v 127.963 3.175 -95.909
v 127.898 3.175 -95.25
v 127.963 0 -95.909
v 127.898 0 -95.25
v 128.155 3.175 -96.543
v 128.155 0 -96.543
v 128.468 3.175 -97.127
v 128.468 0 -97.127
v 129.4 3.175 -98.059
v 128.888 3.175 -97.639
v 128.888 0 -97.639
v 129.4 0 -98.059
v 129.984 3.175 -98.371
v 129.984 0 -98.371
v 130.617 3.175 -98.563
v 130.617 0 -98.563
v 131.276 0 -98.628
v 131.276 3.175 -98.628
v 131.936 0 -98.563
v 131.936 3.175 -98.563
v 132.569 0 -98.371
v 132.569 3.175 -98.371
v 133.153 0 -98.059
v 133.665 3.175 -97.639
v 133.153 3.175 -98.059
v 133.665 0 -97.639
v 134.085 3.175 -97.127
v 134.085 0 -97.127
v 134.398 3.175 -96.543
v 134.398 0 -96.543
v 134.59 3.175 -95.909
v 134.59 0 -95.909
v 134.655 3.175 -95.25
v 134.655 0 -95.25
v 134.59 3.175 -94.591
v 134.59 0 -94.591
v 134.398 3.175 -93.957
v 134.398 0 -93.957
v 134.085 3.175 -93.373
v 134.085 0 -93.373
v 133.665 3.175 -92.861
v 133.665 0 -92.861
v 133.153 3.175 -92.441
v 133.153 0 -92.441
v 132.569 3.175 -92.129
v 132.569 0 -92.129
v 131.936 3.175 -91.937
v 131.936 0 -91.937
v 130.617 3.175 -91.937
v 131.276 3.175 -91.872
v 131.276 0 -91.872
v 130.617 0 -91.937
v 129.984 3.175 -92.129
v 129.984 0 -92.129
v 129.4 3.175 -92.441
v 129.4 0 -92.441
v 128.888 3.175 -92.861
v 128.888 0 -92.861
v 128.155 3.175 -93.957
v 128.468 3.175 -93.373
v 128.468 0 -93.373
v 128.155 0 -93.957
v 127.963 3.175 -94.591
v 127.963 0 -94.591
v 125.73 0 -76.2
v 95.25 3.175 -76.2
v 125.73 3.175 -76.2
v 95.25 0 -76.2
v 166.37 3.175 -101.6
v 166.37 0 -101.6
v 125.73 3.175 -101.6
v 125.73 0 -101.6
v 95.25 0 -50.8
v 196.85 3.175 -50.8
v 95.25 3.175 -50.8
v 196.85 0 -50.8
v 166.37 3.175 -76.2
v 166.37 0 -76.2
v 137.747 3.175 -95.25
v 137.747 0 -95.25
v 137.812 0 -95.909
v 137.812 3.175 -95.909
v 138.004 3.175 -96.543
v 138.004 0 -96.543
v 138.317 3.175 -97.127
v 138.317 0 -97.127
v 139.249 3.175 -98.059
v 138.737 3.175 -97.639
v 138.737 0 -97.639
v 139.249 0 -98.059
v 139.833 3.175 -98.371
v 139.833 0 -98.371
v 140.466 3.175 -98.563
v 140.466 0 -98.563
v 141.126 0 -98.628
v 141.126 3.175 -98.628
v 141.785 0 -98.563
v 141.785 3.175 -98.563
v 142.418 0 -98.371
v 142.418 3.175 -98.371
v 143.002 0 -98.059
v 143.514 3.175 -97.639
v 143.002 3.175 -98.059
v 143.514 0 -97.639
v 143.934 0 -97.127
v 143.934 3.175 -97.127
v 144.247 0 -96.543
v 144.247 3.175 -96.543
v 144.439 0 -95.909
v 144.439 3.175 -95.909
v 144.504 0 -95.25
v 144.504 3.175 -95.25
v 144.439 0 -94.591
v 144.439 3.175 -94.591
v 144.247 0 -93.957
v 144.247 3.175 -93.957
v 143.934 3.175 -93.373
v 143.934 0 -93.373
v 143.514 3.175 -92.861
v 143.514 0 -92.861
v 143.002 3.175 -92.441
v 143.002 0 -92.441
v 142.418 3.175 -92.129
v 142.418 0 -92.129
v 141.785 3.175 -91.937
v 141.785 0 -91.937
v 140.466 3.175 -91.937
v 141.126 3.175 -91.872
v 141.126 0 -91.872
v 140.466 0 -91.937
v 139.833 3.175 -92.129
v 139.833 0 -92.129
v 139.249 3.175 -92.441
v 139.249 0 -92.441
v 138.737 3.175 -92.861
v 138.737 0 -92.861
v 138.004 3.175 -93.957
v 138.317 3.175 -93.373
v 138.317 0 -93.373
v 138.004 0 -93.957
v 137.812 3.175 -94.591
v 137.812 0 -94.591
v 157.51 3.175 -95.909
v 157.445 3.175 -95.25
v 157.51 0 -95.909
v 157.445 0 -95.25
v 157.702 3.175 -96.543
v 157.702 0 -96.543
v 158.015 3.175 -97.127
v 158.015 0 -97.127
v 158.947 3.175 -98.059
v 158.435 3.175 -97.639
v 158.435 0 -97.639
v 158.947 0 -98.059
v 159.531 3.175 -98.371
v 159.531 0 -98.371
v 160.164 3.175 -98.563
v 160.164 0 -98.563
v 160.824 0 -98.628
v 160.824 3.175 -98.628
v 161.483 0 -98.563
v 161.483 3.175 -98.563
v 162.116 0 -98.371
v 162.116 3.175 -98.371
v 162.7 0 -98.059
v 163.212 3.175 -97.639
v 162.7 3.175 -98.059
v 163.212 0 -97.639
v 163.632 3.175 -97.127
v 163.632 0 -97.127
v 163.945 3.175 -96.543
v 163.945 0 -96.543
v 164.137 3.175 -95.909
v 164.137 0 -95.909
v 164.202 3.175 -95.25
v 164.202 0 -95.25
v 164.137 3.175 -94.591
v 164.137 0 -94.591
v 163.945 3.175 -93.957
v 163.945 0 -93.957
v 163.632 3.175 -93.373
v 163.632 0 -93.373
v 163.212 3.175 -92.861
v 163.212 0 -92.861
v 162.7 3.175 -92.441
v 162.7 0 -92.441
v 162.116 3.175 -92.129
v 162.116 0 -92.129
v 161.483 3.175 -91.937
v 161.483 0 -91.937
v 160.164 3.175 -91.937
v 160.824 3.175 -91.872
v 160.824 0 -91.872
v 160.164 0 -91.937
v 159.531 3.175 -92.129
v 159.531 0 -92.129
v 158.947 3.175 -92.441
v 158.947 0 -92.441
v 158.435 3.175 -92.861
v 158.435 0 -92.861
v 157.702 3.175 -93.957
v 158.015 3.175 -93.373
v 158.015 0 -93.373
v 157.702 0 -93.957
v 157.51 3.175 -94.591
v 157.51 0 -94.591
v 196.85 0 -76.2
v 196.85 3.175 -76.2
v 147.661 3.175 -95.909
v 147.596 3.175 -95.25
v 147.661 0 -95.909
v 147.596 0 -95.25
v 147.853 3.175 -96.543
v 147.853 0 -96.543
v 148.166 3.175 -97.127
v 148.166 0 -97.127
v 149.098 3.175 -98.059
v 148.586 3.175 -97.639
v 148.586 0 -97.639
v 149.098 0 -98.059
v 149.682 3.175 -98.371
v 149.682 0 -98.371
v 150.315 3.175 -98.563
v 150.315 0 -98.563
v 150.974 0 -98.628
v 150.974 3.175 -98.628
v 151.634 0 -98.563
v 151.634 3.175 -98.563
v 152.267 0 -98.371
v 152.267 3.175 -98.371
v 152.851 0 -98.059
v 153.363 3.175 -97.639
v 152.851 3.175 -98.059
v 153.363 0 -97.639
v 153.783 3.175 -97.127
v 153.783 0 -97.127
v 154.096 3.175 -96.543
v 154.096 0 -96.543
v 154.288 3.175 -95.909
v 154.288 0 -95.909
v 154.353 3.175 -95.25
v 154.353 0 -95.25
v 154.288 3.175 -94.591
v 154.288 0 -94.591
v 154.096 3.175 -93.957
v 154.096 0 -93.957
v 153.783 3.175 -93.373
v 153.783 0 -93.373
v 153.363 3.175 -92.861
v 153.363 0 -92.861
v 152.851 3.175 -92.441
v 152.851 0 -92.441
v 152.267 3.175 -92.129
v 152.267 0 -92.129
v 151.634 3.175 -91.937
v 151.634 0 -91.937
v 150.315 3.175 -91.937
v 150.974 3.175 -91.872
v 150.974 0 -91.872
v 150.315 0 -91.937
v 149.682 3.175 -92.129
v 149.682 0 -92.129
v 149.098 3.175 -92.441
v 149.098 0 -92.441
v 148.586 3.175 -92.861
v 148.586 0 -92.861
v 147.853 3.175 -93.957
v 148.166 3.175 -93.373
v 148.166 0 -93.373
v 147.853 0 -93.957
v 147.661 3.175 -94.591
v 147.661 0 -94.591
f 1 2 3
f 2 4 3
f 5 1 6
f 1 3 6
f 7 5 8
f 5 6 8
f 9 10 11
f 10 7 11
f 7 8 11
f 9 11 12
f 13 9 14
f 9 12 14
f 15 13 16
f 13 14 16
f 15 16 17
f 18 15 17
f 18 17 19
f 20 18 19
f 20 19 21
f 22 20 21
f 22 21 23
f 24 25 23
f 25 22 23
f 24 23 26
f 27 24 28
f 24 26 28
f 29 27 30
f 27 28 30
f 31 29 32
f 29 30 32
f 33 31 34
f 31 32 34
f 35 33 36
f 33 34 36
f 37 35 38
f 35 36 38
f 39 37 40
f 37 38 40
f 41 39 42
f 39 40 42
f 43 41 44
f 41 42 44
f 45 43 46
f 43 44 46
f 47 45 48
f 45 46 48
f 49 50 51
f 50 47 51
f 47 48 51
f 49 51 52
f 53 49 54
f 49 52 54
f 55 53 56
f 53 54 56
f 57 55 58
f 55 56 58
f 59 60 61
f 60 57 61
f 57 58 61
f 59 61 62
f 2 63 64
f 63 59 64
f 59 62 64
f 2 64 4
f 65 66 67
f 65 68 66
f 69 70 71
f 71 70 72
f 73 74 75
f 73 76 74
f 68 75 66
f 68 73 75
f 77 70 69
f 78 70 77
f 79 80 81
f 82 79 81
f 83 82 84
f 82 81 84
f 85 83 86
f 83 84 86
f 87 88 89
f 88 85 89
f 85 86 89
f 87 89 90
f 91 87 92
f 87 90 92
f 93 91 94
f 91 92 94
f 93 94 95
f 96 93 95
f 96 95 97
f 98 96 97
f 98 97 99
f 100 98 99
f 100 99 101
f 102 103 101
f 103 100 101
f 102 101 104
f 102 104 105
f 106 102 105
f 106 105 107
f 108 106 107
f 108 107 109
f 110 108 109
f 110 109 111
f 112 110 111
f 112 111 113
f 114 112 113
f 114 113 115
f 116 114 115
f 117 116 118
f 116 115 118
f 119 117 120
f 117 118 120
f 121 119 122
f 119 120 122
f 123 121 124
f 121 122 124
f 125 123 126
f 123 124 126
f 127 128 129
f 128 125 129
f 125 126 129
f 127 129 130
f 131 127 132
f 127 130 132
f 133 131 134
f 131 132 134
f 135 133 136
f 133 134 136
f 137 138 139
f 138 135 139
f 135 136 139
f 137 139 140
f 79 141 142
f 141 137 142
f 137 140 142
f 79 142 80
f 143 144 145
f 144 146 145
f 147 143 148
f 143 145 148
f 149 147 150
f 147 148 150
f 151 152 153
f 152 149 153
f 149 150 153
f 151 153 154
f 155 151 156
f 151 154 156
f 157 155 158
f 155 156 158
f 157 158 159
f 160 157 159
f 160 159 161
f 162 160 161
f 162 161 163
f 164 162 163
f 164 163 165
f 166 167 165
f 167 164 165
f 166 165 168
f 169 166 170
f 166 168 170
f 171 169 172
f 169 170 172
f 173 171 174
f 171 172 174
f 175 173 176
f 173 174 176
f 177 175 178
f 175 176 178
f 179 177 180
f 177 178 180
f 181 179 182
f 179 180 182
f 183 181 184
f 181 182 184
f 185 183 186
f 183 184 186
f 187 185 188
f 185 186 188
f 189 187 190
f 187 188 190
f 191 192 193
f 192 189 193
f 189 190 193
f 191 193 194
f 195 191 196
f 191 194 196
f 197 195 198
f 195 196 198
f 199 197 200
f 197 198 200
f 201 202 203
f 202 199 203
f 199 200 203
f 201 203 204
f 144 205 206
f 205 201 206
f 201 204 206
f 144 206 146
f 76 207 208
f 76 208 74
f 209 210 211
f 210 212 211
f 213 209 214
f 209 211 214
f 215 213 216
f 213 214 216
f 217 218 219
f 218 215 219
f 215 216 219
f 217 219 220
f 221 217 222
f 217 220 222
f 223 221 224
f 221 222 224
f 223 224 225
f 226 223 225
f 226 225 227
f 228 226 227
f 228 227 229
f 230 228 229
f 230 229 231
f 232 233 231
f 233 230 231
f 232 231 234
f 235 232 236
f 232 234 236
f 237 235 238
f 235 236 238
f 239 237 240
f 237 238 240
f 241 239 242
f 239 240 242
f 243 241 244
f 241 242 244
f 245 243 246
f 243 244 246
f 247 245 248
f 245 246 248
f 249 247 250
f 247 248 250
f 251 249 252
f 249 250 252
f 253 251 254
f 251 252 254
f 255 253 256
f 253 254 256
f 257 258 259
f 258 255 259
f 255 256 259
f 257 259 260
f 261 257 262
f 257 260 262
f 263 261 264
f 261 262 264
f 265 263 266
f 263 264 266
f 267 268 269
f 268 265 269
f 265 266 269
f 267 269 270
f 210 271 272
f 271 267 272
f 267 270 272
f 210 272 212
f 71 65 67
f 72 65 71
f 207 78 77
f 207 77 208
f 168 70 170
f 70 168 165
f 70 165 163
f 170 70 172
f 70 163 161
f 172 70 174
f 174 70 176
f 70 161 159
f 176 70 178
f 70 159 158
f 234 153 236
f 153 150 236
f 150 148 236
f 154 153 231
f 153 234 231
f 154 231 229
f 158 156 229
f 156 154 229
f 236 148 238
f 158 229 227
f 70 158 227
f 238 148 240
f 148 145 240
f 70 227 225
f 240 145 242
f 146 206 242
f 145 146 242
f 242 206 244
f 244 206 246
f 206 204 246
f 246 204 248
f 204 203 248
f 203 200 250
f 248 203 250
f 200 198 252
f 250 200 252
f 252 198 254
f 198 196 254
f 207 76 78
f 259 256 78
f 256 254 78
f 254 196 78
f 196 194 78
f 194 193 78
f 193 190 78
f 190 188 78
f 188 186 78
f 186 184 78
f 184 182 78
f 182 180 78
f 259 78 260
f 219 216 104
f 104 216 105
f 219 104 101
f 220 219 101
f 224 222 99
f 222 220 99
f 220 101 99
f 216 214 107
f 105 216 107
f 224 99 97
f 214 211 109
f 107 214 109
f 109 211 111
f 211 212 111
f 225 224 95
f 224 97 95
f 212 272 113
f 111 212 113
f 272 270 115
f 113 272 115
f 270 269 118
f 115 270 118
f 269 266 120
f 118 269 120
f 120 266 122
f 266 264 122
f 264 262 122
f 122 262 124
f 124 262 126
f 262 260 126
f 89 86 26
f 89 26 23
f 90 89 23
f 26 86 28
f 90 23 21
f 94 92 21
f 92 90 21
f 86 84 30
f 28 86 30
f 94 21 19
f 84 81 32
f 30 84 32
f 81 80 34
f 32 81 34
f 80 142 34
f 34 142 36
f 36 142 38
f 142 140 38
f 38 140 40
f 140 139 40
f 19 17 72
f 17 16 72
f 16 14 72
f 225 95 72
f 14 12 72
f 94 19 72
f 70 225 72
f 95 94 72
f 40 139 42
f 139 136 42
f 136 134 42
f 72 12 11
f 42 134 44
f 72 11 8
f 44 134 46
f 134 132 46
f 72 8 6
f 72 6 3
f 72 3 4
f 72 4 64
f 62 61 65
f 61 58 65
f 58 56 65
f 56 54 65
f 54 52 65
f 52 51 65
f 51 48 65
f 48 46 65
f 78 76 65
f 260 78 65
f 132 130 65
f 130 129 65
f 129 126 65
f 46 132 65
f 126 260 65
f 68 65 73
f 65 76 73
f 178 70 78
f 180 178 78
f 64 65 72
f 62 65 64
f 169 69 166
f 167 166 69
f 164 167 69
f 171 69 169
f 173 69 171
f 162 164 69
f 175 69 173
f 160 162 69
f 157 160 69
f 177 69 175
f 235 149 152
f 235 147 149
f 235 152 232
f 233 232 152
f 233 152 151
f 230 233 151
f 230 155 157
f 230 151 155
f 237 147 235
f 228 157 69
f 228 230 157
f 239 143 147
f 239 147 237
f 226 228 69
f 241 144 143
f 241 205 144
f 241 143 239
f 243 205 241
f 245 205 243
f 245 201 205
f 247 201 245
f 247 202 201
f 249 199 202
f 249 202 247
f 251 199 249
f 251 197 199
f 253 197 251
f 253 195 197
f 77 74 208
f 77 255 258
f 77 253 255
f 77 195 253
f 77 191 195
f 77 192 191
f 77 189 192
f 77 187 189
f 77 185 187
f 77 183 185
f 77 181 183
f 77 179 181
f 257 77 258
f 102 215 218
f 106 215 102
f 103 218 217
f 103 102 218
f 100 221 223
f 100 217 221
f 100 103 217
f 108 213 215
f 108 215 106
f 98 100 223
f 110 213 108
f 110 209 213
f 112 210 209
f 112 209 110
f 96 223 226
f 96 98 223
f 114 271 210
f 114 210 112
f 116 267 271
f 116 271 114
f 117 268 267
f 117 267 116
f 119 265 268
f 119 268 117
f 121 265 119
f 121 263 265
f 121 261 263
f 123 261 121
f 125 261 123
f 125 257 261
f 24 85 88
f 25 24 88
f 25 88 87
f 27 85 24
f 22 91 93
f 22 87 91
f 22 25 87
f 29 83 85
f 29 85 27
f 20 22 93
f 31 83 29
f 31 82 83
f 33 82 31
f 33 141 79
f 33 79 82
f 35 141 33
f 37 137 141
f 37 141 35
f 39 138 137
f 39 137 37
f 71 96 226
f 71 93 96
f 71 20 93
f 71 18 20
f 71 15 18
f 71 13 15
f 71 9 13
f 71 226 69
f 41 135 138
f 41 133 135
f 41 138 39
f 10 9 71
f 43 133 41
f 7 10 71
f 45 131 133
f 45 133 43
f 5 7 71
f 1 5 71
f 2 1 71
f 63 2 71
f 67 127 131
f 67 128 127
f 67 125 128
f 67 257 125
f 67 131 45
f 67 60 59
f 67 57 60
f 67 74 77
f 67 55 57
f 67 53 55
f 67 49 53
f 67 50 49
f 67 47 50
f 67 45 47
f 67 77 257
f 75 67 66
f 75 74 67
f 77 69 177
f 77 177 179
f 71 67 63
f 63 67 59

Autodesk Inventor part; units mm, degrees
ref_plane "YZ Plane" through (0, 0, 0) normal (1, 0, 0) x (0, 1, 0)
ref_plane "XZ Plane" through (0, 0, 0) normal (0, 1, 0) x (-1, 0, 0)
ref_plane "XY Plane" through (0, 0, 0) normal (0, 0, 1) x (1, 0, 0)
sketch "Sketch1" plane through (0, 0, 0) normal (0, 1, 0) x (-1, 0, 0)
  circle A0 centre (-131.2765, -95.25) radius 3.3782
  circle A1 centre (-141.1255, -95.25) radius 3.3782
  circle A2 centre (-150.9745, -95.25) radius 3.3782
  circle A3 centre (-160.8235, -95.25) radius 3.3782
  line L0 (-146.05, -156.4252) -> (-146.05, 317.5689) construction
  line L1 (-125.73, -156.4252) -> (-125.73, 317.5689) construction
  line L2 (-166.37, -156.4252) -> (-166.37, 317.5689) construction
  line L3 (-166.37, -101.6) -> (-166.37, -76.2)
  line L4 (-166.37, -76.2) -> (-196.85, -76.2)
  line L5 (-196.85, -76.2) -> (-196.85, -50.8)
  line L6 (-196.85, -50.8) -> (-95.25, -50.8)
  line L7 (-95.25, -50.8) -> (-95.25, -76.2)
  line L8 (-95.25, -76.2) -> (-125.73, -76.2)
  line L9 (-125.73, -76.2) -> (-125.73, -101.6)
  line L10 (-166.37, -101.6) -> (-125.73, -101.6)
  dimension "d4" = 20.32
  dimension "d5" = 20.32
  dimension "d6" = 25.4
  dimension "d7" = 30.48
  dimension "d8" = 25.4
  dimension "d9" = 101.6
  dimension "d10" = 30.48
extrude "Extrusion1" add sketch "Sketch1" along normal blind 3.175
properties part number "Mount Motor"
